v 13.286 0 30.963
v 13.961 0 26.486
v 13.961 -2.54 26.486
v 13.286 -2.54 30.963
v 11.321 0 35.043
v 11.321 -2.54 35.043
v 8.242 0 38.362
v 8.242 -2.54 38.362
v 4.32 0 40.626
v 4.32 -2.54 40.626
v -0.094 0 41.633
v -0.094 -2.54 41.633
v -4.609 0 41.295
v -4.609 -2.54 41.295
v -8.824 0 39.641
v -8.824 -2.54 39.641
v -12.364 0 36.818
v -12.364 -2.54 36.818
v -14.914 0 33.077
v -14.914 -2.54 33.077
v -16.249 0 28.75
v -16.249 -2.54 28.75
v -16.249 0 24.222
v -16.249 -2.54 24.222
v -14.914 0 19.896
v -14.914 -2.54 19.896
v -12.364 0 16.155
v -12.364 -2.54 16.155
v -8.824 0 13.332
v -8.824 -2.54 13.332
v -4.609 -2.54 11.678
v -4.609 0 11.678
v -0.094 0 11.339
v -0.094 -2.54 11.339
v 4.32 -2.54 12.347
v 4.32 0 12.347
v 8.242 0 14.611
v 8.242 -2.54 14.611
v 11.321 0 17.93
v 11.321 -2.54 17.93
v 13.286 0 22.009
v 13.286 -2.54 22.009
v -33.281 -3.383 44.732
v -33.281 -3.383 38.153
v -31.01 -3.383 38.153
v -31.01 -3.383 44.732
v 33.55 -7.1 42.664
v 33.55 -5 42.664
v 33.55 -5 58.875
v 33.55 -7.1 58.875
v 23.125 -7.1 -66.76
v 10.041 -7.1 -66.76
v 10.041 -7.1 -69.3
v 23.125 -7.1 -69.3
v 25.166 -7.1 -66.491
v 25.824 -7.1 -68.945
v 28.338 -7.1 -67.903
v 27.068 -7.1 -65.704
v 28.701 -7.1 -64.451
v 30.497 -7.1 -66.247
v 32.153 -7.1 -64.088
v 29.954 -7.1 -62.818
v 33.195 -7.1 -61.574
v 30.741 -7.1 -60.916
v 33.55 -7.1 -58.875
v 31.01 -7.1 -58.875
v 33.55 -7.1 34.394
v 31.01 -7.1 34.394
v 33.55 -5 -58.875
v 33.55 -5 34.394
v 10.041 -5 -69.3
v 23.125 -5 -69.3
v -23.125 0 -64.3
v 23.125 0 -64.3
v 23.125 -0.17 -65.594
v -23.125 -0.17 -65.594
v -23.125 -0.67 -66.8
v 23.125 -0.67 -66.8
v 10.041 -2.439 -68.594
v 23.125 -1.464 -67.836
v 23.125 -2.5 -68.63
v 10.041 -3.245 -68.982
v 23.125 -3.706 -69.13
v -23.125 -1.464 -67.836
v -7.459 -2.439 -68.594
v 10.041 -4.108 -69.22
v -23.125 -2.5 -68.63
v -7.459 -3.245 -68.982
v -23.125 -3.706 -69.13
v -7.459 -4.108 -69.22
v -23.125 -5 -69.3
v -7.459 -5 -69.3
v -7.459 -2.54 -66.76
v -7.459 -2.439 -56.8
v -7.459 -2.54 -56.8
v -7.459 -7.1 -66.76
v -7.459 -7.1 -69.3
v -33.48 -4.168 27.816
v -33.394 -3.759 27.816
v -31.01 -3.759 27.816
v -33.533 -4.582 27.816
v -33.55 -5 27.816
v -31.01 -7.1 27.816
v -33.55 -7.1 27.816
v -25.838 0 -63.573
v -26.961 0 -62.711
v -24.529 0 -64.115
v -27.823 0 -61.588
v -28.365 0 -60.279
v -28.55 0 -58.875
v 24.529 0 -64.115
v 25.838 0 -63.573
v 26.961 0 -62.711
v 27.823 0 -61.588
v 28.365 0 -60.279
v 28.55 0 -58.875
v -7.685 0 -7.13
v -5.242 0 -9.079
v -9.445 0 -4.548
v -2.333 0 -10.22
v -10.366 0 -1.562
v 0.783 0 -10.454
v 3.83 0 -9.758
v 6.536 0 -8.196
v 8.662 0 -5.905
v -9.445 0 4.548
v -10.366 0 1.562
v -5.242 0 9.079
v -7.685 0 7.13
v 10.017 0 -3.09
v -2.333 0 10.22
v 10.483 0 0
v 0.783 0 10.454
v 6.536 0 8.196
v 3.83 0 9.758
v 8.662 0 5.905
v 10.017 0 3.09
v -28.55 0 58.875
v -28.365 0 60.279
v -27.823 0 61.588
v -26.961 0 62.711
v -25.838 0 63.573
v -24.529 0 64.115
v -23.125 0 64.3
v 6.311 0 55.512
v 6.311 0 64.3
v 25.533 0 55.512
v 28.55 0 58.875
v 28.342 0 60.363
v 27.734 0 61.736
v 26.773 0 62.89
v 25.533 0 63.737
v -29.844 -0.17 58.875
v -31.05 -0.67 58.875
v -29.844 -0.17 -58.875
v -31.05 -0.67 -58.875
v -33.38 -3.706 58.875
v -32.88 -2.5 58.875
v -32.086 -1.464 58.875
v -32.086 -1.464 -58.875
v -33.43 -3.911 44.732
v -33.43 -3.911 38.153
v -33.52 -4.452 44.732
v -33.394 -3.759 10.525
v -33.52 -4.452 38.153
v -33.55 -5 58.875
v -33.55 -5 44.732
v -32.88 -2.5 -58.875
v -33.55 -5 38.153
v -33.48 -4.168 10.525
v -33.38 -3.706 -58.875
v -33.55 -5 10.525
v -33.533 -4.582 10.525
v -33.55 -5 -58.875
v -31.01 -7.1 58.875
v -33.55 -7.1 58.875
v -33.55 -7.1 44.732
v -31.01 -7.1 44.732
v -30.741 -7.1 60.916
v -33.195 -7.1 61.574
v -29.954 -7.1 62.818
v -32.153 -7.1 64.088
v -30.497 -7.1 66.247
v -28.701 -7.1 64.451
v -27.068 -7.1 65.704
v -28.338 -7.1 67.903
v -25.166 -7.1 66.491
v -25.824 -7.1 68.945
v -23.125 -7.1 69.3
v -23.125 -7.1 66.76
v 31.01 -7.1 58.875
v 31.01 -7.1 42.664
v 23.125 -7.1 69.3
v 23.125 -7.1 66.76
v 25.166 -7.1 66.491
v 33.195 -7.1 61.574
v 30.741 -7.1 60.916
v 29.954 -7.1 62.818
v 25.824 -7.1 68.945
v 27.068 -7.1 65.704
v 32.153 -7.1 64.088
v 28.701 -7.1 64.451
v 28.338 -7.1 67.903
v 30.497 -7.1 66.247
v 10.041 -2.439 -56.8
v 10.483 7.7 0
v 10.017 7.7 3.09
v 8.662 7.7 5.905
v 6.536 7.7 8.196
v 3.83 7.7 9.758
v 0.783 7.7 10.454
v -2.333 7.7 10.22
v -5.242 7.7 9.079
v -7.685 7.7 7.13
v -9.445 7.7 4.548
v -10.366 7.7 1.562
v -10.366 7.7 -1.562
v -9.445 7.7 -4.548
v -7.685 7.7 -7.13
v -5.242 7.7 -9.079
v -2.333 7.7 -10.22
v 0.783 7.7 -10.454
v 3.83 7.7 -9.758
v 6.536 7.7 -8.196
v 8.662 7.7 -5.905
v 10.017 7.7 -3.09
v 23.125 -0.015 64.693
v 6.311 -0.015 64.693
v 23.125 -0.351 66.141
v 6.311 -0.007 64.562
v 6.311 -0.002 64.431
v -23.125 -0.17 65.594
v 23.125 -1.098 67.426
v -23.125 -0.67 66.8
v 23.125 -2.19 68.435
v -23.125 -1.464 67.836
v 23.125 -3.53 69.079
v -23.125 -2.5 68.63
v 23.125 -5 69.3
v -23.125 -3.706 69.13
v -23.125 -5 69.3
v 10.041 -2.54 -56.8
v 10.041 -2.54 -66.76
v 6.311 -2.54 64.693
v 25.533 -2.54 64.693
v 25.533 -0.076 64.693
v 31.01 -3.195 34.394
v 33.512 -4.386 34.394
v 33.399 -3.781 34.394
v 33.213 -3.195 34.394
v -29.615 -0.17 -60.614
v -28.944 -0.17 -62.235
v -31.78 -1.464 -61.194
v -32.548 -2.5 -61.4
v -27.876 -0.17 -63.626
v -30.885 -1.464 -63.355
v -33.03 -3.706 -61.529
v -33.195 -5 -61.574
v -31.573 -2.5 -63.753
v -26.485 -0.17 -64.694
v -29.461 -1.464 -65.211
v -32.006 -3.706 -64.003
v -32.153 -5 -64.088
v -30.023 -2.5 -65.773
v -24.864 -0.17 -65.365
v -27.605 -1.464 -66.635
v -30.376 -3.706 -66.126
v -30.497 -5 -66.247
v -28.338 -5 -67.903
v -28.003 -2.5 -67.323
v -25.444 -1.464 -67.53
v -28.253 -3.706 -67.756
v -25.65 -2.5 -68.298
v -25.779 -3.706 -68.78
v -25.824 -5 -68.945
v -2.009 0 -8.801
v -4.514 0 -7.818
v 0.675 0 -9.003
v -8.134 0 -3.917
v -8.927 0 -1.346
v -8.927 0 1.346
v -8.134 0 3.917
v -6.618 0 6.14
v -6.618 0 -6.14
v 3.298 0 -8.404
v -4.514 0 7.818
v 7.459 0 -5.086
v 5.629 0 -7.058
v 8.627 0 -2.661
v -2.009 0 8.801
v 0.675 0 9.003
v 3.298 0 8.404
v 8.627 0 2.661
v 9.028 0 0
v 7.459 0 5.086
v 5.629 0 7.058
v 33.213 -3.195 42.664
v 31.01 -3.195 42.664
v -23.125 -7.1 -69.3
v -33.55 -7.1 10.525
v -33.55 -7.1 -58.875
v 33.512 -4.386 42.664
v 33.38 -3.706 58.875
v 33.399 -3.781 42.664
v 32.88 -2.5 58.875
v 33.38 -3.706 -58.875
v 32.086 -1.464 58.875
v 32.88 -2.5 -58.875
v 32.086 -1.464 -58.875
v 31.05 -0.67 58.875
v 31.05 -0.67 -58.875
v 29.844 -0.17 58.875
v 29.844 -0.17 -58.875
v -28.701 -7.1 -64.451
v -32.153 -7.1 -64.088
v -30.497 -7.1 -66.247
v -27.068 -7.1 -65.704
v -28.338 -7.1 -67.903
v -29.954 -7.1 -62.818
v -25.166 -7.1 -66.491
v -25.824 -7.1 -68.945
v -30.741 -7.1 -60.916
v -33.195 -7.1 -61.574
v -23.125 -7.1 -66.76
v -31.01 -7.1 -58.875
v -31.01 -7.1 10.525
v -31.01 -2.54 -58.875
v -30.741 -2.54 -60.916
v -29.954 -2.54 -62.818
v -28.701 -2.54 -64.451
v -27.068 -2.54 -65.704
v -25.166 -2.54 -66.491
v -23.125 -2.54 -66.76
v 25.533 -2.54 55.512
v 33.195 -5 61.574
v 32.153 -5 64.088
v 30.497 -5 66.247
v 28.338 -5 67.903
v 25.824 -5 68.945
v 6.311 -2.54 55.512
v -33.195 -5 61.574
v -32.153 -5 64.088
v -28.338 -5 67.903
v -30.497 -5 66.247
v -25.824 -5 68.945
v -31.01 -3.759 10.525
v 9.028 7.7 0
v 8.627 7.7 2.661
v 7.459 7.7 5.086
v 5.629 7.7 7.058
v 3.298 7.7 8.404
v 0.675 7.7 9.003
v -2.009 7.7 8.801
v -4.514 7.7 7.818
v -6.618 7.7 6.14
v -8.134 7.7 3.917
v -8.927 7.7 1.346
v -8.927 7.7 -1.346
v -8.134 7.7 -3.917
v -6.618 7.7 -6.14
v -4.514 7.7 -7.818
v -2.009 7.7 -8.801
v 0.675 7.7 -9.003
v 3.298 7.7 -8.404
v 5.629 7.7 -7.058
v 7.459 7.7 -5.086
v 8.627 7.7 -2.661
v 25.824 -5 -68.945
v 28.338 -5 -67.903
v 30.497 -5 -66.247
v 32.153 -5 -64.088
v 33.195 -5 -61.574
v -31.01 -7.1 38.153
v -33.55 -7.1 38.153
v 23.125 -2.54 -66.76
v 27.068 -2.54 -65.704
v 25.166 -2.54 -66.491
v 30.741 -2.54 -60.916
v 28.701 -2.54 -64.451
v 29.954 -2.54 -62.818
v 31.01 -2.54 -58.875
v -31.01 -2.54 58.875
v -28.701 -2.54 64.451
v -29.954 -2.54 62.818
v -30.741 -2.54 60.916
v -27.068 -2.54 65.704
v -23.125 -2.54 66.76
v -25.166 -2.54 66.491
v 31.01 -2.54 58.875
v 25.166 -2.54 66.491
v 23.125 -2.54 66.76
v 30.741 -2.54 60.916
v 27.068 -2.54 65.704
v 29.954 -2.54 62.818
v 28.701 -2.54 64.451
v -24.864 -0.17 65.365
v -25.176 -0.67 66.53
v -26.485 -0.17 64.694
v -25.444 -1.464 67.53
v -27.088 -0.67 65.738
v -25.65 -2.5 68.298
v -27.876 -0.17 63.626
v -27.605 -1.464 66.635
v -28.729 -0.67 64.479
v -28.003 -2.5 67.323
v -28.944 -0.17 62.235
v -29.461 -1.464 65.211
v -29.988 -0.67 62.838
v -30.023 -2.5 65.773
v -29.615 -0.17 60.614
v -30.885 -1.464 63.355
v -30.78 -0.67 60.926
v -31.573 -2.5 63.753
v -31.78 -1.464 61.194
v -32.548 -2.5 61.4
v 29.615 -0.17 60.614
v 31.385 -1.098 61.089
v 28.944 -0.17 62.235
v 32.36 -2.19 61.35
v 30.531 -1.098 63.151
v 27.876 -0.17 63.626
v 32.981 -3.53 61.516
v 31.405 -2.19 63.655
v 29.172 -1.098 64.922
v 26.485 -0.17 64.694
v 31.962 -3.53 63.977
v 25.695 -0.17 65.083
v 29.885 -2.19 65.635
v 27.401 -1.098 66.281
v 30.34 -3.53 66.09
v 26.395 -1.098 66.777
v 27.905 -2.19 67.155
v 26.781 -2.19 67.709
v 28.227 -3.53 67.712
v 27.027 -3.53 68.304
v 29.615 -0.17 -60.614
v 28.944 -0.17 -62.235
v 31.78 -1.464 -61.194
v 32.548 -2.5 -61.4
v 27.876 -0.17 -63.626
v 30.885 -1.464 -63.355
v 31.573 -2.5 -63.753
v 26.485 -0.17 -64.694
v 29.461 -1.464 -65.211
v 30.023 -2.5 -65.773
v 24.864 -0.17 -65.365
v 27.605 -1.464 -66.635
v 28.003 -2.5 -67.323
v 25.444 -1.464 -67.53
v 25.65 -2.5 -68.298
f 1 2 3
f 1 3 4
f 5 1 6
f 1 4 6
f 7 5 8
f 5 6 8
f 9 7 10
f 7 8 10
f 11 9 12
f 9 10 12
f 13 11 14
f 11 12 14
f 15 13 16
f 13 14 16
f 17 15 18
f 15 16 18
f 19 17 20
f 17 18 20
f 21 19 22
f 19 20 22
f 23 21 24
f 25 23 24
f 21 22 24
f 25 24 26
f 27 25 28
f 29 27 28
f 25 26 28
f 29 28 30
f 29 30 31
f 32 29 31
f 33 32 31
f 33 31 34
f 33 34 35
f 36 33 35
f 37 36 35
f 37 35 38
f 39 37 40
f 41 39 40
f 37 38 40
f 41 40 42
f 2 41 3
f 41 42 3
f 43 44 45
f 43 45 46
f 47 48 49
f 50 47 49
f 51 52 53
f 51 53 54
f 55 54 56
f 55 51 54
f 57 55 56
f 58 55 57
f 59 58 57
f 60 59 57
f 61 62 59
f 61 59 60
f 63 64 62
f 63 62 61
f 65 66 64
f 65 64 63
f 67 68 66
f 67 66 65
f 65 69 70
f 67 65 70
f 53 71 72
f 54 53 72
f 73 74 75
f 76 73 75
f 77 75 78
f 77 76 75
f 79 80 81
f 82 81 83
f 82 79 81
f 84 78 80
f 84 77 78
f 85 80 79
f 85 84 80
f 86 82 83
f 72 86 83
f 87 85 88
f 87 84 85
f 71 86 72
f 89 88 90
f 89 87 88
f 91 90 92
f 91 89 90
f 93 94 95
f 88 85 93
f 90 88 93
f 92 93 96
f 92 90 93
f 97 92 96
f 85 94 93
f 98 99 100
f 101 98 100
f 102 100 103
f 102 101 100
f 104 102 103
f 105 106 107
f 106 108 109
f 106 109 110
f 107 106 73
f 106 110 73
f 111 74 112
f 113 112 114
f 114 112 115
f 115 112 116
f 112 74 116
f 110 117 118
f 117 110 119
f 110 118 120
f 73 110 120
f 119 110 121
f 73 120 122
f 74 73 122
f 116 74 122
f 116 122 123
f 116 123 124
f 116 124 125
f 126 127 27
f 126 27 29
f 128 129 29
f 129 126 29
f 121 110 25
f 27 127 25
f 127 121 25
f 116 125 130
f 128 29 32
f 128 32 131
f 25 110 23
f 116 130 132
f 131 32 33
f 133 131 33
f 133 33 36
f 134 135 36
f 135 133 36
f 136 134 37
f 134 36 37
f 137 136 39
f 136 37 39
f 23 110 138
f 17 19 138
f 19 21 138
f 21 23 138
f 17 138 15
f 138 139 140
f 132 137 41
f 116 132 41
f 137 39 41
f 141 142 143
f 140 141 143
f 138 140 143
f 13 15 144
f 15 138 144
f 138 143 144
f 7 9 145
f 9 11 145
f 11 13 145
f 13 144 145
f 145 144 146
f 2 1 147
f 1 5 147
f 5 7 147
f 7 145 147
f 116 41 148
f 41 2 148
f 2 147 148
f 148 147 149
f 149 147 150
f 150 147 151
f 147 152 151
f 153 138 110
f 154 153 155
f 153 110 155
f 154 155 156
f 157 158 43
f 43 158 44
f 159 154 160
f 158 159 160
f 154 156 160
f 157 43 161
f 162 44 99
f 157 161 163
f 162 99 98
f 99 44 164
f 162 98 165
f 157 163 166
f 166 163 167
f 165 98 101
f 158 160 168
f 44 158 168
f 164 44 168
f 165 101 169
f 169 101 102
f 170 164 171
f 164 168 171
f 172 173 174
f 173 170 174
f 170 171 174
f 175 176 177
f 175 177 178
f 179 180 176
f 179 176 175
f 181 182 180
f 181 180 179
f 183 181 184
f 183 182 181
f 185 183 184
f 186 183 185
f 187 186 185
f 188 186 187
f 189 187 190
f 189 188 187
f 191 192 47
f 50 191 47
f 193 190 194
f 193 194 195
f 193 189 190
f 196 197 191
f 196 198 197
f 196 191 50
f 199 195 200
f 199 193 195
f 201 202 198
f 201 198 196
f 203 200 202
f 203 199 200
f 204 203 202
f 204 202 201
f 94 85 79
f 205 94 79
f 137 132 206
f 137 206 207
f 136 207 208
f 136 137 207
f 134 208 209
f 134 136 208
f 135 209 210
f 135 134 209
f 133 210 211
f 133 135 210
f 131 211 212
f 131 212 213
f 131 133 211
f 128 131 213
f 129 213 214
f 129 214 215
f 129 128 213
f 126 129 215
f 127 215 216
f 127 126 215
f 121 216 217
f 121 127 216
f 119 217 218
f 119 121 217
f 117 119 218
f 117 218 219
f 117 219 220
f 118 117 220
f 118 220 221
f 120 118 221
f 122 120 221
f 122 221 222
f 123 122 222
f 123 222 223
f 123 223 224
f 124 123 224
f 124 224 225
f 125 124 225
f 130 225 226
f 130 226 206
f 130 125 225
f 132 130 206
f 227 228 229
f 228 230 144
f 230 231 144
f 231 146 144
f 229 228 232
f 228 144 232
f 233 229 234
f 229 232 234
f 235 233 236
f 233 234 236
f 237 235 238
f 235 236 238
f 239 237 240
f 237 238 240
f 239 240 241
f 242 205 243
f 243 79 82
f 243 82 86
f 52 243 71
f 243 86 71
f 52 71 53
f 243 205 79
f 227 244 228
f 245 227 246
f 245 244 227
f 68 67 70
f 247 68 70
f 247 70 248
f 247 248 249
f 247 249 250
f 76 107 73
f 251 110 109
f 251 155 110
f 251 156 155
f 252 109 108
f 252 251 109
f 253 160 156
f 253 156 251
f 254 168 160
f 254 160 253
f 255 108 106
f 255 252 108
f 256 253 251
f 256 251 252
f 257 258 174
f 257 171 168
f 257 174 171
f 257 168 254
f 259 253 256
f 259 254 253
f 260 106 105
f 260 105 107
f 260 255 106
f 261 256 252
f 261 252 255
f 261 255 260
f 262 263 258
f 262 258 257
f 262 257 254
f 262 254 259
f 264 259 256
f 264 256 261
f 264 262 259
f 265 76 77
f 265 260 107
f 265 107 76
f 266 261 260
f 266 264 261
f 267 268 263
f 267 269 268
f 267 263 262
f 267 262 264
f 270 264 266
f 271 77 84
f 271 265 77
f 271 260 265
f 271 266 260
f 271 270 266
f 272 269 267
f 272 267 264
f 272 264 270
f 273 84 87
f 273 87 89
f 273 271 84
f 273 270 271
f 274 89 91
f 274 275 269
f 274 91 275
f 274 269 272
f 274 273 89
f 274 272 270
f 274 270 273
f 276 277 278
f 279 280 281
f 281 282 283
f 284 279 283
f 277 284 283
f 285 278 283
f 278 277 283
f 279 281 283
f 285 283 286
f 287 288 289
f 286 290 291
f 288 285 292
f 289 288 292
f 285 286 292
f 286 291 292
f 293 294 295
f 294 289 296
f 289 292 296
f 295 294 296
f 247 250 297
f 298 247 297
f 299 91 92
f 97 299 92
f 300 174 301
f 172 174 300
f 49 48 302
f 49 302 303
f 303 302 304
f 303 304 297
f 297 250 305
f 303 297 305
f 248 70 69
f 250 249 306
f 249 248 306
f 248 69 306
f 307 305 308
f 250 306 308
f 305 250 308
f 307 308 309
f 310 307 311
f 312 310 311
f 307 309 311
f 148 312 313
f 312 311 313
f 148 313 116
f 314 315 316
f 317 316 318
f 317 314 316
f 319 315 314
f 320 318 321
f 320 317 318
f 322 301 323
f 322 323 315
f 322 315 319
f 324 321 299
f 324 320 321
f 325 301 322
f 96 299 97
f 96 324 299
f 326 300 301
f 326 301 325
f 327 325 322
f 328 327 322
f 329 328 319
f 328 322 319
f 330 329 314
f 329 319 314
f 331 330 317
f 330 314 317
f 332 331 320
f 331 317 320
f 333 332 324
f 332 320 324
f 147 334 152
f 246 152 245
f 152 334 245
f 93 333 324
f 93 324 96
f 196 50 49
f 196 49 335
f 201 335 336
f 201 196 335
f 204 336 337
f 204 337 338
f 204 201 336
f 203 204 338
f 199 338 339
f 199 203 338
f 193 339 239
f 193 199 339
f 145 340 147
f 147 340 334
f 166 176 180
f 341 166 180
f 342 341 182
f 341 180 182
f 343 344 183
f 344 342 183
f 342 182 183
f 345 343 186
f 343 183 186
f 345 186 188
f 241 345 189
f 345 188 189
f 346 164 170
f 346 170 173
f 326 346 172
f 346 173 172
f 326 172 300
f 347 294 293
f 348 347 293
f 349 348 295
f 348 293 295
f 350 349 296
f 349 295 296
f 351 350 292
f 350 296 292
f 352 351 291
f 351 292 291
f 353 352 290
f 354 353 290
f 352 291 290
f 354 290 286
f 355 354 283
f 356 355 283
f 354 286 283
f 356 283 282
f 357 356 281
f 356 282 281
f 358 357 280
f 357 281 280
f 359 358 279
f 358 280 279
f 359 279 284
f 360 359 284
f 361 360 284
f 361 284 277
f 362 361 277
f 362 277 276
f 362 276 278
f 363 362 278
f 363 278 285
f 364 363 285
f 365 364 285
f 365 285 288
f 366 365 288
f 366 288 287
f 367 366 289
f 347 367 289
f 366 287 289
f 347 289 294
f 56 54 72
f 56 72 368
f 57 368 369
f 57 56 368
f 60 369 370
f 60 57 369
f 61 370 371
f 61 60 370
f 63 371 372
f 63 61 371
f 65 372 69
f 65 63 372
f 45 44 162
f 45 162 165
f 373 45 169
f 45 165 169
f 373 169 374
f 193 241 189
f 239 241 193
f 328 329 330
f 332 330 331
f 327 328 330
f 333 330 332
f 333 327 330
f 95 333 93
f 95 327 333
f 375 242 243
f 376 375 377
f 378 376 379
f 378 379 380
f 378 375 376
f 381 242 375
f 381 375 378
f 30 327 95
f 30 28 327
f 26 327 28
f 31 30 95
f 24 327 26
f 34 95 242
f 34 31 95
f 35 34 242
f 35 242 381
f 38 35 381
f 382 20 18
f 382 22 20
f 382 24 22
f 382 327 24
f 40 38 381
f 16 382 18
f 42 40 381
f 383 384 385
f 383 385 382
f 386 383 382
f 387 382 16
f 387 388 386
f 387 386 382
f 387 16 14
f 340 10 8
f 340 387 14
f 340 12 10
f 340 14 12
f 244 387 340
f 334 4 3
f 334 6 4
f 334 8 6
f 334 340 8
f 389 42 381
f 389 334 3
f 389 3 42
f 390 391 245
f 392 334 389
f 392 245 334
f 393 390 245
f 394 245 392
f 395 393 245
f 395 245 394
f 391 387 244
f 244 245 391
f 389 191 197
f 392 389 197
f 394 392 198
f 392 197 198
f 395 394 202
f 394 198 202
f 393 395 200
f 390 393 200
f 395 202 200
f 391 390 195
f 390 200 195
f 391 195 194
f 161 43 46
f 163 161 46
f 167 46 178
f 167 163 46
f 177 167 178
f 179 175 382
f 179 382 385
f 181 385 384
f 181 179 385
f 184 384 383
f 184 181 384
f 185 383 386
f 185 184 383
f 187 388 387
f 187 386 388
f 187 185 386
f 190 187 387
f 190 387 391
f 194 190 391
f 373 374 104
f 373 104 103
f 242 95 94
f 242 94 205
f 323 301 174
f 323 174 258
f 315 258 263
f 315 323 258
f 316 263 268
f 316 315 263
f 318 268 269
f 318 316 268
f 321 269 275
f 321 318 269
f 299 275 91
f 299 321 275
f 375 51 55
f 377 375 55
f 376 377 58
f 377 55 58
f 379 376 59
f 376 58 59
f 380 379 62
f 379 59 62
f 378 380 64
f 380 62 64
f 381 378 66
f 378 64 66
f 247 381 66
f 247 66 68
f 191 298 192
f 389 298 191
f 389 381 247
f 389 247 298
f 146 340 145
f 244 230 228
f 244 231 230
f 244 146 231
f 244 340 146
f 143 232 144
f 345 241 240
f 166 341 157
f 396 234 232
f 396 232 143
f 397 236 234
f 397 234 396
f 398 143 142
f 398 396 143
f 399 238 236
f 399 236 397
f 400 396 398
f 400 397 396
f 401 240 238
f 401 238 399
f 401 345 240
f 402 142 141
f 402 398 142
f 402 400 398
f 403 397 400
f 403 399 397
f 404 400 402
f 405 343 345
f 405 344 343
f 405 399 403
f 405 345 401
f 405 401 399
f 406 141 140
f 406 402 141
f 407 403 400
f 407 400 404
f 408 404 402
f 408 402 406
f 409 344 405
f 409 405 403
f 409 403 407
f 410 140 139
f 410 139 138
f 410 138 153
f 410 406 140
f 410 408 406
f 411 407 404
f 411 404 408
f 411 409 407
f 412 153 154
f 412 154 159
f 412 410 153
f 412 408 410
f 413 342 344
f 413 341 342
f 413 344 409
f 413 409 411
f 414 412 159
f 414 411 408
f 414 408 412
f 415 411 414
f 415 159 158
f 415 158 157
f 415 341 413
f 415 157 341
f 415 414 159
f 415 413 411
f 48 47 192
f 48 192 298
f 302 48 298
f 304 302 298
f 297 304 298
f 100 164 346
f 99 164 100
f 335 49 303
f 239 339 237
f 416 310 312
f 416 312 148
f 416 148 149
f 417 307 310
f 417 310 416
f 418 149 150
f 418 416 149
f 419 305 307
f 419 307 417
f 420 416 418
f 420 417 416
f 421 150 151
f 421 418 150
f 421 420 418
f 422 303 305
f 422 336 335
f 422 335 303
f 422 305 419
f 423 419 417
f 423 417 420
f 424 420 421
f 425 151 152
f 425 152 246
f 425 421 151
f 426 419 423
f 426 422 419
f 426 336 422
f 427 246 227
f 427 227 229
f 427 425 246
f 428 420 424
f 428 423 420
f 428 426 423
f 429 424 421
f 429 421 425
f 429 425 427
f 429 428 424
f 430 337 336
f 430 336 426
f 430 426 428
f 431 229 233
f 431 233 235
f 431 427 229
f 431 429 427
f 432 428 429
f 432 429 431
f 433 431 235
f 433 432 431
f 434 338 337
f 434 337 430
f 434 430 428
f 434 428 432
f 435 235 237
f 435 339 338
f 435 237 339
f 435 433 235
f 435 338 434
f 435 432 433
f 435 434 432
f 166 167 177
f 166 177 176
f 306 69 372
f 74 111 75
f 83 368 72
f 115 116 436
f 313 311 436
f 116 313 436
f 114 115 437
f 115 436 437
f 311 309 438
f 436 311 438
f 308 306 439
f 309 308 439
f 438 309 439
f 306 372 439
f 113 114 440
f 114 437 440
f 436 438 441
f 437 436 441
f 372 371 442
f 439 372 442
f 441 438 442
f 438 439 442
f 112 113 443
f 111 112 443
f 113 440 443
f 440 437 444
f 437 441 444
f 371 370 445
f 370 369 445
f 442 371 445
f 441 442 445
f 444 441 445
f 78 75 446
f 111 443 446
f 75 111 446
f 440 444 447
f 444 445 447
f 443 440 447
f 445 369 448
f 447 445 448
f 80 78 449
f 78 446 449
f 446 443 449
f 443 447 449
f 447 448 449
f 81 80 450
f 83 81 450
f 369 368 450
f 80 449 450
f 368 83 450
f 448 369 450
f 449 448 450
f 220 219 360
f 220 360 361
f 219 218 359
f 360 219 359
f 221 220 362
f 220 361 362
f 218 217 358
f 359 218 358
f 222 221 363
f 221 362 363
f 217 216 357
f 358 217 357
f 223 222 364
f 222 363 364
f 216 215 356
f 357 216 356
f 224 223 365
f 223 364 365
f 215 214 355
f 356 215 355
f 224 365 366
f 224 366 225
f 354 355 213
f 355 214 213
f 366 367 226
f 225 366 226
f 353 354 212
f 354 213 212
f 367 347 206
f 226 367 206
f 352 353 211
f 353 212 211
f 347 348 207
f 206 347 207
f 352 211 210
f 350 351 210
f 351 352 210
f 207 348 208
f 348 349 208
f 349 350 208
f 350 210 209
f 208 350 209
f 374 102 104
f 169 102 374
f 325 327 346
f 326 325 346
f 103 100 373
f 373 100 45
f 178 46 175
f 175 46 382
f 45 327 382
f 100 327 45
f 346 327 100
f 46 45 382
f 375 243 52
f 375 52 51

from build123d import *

# Parameters (mm, degrees)
F0_W          = 67.1
F0_H          = 138.6
F1_DEPTH      = 7.1
F2_R          = 10.4245741623
F3_T          = -2.54
F4_W          = 19.2213095725
F4_H          = 9.1803260148
F5_DEPTH      = 12.5
F6_W          = 17.5000010058
F6_H          = 4.661475262
F7_DEPTH      = 12.5
F8_W          = 3.0759498477
F8_H          = 14.1388773918
F9_DEPTH      = 12.5
F10_W         = 3.7169439722
F10_H         = 6.5781623125
F11_DEPTH     = 12.5
F12_W         = 3.3410489097
F12_H         = 17.2911705449
F13_DEPTH     = 12.5
F14_W         = 3.904892784
F14_H         = 8.2696899772
F15_DEPTH     = 12.5
F16_T1_DEPTH  = 117.7508516753
F16_T3_DEPTH  = 46.2508516753
F16_T6_ANGLE  = 90
F16_T8_ANGLE  = 90
F16_T10_ANGLE = 90
F16_T12_ANGLE = 90
F17_R         = 15.1895589548
F18_DEPTH     = 12.5
F19_R         = 10.4830955048
F19_R_2       = 9.0277735867
F20_DEPTH     = 7.7


# Not quite as in the source:
# - a fillet or chamfer that OpenCascade refuses, or shapes differently, is made with other operations: its cross-section is extruded or revolved along the edge and cut away or added


with BuildPart() as f1:
    # F0 (on Front) → F1 (new body)
    with BuildSketch(Plane.XZ):
        Rectangle(F0_W, F0_H)
    extrude(amount=F1_DEPTH)

    # F2
    f2_edges = [f1.edges().sort_by_distance(p)[0] for p in [
        (33.55, -3.55, 69.3),
        (-33.55, -3.55, 69.3),
        (-33.55, -3.55, -69.3),
        (33.55, -3.55, -69.3),
    ]]
    fillet(f2_edges, radius=F2_R)

    # F3
    f3_openings = [f1.faces().sort_by_distance(p)[0] for p in [
        (0, -7.1, 0),
    ]]
    offset(amount=F3_T, openings=f3_openings)

    # F4 (on Front) → F5 (cut, symmetric)
    with BuildSketch(Plane.XZ):
        with Locations((15.9221310169, 60.1024609059)):
            Rectangle(F4_W, F4_H)
    extrude(amount=F5_DEPTH, both=True, mode=Mode.SUBTRACT)

    # F6 (on face) → F7 (cut, symmetric)
    with BuildSketch(Plane(origin=(0, 0, -69.3), x_dir=(1, 0, 0), z_dir=(0, 0, -1))):
        with Locations((1.2909830548, 4.769262369)):
            Rectangle(F6_W, F6_H)
    extrude(amount=F7_DEPTH, both=True, mode=Mode.SUBTRACT)

    # F8 (on Front) → F9 (cut, symmetric)
    with BuildSketch(Plane.XZ):
        with Locations((35.5030968785, 36.7480814457)):
            Rectangle(F8_W, F8_H)
    extrude(amount=F9_DEPTH, both=True, mode=Mode.SUBTRACT)

    # F10 (on face) → F11 (cut, symmetric)
    with BuildSketch(Plane(origin=(-33.55, 0, 0), x_dir=(0, -1, 0), z_dir=(-1, 0, 0))):
        with Locations((5.2415280139, 41.4424240589)):
            Rectangle(F10_W, F10_H)
    extrude(amount=F11_DEPTH, both=True, mode=Mode.SUBTRACT)

    # F12 (on face) → F13 (cut, symmetric)
    with BuildSketch(Plane(origin=(-33.55, 0, 0), x_dir=(0, -1, 0), z_dir=(-1, 0, 0))):
        with Locations((5.4294755451, 19.1706451587)):
            Rectangle(F12_W, F12_H)
    extrude(amount=F13_DEPTH, both=True, mode=Mode.SUBTRACT)

    # F14 (on face) → F15 (cut, symmetric)
    with BuildSketch(Plane.YZ.offset(33.55)):
        with Locations((-5.147553608, 38.5292358696)):
            Rectangle(F14_W, F14_H)
    extrude(amount=F15_DEPTH, both=True, mode=Mode.SUBTRACT)

    # F16: fillet of radius 5 on 1 edges, made by hand

    # F16_s2 → F16_t1 (cut)
    with BuildSketch(Plane.XY.offset(-58.8754258377)):
        with BuildLine():
            ThreePointArc((33.55, -5), (32.0855339059, -1.4644660941), (28.55, 0))
            Line((28.55, 0), (33.55, 0))
            Line((33.55, 0), (33.55, -5))
        make_face()
        with BuildLine():
            ThreePointArc((-28.55, 0), (-32.0855339059, -1.4644660941), (-33.55, -5))
            Line((-33.55, -5), (-33.55, 0))
            Line((-33.55, 0), (-28.55, 0))
        make_face()
    extrude(amount=F16_T1_DEPTH, mode=Mode.SUBTRACT)

    # F16_s4 → F16_t3 (cut)
    with BuildSketch(Plane.YZ.offset(-23.1254258377)):
        with BuildLine():
            ThreePointArc((0, 64.3), (-1.4644660941, 67.8355339059), (-5, 69.3))
            Line((-5, 69.3), (0, 69.3))
            Line((0, 69.3), (0, 64.3))
        make_face()
        with BuildLine():
            ThreePointArc((0, -64.3), (-1.4644660941, -67.8355339059), (-5, -69.3))
            Line((-5, -69.3), (0, -69.3))
            Line((0, -69.3), (0, -64.3))
        make_face()
    extrude(amount=F16_T3_DEPTH, mode=Mode.SUBTRACT)

    # F16_s5 → F16_t6 (revolve, cut)
    with BuildSketch(Plane.XY.offset(-58.8754258377)):
        with BuildLine():
            ThreePointArc((28.55, 0), (32.0855339059, -1.4644660941), (33.55, -5))
            Line((33.55, -5), (33.55, 0))
            Line((33.55, 0), (28.55, 0))
        make_face()
    revolve(axis=Axis((23.1254258377, 0, -58.8754258377), (0, 1, 0)), revolution_arc=F16_T6_ANGLE, mode=Mode.SUBTRACT)

    # F16_s7 → F16_t8 (revolve, cut)
    with BuildSketch(Plane.XY.offset(58.8754258377)):
        with BuildLine():
            ThreePointArc((28.55, 0), (32.0855339059, -1.4644660941), (33.55, -5))
            Line((33.55, -5), (33.55, 0))
            Line((33.55, 0), (28.55, 0))
        make_face()
    revolve(axis=Axis((23.1254258377, 0, 58.8754258377), (0, -1, 0)), revolution_arc=F16_T8_ANGLE, mode=Mode.SUBTRACT)

    # F16_s9 → F16_t10 (revolve, cut)
    with BuildSketch(Plane.YZ.offset(-23.1254258377)):
        with BuildLine():
            ThreePointArc((0, 64.3), (-1.4644660941, 67.8355339059), (-5, 69.3))
            Line((-5, 69.3), (0, 69.3))
            Line((0, 69.3), (0, 64.3))
        make_face()
    revolve(axis=Axis((-23.1254258377, 0, 58.8754258377), (0, -1, 0)), revolution_arc=F16_T10_ANGLE, mode=Mode.SUBTRACT)

    # F16_s11 → F16_t12 (revolve, cut)
    with BuildSketch(Plane.XY.offset(-58.8754258377)):
        with BuildLine():
            ThreePointArc((-28.55, 0), (-32.0855339059, -1.4644660941), (-33.55, -5))
            Line((-33.55, -5), (-33.55, 0))
            Line((-33.55, 0), (-28.55, 0))
        make_face()
    revolve(axis=Axis((-23.1254258377, 0, -58.8754258377), (0, -1, 0)), revolution_arc=F16_T12_ANGLE, mode=Mode.SUBTRACT)

    # F17 (on Front) → F18 (cut, symmetric)
    with BuildSketch(Plane.XZ):
        with Locations((-1.2289978711, 26.4862392154)):
            Circle(F17_R)
    extrude(amount=F18_DEPTH, both=True, mode=Mode.SUBTRACT)

    # F19 (on Front) → F20 (join)
    with BuildSketch(Plane.XZ):
        Circle(F19_R)
        Circle(F19_R_2, mode=Mode.SUBTRACT)
    extrude(amount=-F20_DEPTH)


solid = f1.part
